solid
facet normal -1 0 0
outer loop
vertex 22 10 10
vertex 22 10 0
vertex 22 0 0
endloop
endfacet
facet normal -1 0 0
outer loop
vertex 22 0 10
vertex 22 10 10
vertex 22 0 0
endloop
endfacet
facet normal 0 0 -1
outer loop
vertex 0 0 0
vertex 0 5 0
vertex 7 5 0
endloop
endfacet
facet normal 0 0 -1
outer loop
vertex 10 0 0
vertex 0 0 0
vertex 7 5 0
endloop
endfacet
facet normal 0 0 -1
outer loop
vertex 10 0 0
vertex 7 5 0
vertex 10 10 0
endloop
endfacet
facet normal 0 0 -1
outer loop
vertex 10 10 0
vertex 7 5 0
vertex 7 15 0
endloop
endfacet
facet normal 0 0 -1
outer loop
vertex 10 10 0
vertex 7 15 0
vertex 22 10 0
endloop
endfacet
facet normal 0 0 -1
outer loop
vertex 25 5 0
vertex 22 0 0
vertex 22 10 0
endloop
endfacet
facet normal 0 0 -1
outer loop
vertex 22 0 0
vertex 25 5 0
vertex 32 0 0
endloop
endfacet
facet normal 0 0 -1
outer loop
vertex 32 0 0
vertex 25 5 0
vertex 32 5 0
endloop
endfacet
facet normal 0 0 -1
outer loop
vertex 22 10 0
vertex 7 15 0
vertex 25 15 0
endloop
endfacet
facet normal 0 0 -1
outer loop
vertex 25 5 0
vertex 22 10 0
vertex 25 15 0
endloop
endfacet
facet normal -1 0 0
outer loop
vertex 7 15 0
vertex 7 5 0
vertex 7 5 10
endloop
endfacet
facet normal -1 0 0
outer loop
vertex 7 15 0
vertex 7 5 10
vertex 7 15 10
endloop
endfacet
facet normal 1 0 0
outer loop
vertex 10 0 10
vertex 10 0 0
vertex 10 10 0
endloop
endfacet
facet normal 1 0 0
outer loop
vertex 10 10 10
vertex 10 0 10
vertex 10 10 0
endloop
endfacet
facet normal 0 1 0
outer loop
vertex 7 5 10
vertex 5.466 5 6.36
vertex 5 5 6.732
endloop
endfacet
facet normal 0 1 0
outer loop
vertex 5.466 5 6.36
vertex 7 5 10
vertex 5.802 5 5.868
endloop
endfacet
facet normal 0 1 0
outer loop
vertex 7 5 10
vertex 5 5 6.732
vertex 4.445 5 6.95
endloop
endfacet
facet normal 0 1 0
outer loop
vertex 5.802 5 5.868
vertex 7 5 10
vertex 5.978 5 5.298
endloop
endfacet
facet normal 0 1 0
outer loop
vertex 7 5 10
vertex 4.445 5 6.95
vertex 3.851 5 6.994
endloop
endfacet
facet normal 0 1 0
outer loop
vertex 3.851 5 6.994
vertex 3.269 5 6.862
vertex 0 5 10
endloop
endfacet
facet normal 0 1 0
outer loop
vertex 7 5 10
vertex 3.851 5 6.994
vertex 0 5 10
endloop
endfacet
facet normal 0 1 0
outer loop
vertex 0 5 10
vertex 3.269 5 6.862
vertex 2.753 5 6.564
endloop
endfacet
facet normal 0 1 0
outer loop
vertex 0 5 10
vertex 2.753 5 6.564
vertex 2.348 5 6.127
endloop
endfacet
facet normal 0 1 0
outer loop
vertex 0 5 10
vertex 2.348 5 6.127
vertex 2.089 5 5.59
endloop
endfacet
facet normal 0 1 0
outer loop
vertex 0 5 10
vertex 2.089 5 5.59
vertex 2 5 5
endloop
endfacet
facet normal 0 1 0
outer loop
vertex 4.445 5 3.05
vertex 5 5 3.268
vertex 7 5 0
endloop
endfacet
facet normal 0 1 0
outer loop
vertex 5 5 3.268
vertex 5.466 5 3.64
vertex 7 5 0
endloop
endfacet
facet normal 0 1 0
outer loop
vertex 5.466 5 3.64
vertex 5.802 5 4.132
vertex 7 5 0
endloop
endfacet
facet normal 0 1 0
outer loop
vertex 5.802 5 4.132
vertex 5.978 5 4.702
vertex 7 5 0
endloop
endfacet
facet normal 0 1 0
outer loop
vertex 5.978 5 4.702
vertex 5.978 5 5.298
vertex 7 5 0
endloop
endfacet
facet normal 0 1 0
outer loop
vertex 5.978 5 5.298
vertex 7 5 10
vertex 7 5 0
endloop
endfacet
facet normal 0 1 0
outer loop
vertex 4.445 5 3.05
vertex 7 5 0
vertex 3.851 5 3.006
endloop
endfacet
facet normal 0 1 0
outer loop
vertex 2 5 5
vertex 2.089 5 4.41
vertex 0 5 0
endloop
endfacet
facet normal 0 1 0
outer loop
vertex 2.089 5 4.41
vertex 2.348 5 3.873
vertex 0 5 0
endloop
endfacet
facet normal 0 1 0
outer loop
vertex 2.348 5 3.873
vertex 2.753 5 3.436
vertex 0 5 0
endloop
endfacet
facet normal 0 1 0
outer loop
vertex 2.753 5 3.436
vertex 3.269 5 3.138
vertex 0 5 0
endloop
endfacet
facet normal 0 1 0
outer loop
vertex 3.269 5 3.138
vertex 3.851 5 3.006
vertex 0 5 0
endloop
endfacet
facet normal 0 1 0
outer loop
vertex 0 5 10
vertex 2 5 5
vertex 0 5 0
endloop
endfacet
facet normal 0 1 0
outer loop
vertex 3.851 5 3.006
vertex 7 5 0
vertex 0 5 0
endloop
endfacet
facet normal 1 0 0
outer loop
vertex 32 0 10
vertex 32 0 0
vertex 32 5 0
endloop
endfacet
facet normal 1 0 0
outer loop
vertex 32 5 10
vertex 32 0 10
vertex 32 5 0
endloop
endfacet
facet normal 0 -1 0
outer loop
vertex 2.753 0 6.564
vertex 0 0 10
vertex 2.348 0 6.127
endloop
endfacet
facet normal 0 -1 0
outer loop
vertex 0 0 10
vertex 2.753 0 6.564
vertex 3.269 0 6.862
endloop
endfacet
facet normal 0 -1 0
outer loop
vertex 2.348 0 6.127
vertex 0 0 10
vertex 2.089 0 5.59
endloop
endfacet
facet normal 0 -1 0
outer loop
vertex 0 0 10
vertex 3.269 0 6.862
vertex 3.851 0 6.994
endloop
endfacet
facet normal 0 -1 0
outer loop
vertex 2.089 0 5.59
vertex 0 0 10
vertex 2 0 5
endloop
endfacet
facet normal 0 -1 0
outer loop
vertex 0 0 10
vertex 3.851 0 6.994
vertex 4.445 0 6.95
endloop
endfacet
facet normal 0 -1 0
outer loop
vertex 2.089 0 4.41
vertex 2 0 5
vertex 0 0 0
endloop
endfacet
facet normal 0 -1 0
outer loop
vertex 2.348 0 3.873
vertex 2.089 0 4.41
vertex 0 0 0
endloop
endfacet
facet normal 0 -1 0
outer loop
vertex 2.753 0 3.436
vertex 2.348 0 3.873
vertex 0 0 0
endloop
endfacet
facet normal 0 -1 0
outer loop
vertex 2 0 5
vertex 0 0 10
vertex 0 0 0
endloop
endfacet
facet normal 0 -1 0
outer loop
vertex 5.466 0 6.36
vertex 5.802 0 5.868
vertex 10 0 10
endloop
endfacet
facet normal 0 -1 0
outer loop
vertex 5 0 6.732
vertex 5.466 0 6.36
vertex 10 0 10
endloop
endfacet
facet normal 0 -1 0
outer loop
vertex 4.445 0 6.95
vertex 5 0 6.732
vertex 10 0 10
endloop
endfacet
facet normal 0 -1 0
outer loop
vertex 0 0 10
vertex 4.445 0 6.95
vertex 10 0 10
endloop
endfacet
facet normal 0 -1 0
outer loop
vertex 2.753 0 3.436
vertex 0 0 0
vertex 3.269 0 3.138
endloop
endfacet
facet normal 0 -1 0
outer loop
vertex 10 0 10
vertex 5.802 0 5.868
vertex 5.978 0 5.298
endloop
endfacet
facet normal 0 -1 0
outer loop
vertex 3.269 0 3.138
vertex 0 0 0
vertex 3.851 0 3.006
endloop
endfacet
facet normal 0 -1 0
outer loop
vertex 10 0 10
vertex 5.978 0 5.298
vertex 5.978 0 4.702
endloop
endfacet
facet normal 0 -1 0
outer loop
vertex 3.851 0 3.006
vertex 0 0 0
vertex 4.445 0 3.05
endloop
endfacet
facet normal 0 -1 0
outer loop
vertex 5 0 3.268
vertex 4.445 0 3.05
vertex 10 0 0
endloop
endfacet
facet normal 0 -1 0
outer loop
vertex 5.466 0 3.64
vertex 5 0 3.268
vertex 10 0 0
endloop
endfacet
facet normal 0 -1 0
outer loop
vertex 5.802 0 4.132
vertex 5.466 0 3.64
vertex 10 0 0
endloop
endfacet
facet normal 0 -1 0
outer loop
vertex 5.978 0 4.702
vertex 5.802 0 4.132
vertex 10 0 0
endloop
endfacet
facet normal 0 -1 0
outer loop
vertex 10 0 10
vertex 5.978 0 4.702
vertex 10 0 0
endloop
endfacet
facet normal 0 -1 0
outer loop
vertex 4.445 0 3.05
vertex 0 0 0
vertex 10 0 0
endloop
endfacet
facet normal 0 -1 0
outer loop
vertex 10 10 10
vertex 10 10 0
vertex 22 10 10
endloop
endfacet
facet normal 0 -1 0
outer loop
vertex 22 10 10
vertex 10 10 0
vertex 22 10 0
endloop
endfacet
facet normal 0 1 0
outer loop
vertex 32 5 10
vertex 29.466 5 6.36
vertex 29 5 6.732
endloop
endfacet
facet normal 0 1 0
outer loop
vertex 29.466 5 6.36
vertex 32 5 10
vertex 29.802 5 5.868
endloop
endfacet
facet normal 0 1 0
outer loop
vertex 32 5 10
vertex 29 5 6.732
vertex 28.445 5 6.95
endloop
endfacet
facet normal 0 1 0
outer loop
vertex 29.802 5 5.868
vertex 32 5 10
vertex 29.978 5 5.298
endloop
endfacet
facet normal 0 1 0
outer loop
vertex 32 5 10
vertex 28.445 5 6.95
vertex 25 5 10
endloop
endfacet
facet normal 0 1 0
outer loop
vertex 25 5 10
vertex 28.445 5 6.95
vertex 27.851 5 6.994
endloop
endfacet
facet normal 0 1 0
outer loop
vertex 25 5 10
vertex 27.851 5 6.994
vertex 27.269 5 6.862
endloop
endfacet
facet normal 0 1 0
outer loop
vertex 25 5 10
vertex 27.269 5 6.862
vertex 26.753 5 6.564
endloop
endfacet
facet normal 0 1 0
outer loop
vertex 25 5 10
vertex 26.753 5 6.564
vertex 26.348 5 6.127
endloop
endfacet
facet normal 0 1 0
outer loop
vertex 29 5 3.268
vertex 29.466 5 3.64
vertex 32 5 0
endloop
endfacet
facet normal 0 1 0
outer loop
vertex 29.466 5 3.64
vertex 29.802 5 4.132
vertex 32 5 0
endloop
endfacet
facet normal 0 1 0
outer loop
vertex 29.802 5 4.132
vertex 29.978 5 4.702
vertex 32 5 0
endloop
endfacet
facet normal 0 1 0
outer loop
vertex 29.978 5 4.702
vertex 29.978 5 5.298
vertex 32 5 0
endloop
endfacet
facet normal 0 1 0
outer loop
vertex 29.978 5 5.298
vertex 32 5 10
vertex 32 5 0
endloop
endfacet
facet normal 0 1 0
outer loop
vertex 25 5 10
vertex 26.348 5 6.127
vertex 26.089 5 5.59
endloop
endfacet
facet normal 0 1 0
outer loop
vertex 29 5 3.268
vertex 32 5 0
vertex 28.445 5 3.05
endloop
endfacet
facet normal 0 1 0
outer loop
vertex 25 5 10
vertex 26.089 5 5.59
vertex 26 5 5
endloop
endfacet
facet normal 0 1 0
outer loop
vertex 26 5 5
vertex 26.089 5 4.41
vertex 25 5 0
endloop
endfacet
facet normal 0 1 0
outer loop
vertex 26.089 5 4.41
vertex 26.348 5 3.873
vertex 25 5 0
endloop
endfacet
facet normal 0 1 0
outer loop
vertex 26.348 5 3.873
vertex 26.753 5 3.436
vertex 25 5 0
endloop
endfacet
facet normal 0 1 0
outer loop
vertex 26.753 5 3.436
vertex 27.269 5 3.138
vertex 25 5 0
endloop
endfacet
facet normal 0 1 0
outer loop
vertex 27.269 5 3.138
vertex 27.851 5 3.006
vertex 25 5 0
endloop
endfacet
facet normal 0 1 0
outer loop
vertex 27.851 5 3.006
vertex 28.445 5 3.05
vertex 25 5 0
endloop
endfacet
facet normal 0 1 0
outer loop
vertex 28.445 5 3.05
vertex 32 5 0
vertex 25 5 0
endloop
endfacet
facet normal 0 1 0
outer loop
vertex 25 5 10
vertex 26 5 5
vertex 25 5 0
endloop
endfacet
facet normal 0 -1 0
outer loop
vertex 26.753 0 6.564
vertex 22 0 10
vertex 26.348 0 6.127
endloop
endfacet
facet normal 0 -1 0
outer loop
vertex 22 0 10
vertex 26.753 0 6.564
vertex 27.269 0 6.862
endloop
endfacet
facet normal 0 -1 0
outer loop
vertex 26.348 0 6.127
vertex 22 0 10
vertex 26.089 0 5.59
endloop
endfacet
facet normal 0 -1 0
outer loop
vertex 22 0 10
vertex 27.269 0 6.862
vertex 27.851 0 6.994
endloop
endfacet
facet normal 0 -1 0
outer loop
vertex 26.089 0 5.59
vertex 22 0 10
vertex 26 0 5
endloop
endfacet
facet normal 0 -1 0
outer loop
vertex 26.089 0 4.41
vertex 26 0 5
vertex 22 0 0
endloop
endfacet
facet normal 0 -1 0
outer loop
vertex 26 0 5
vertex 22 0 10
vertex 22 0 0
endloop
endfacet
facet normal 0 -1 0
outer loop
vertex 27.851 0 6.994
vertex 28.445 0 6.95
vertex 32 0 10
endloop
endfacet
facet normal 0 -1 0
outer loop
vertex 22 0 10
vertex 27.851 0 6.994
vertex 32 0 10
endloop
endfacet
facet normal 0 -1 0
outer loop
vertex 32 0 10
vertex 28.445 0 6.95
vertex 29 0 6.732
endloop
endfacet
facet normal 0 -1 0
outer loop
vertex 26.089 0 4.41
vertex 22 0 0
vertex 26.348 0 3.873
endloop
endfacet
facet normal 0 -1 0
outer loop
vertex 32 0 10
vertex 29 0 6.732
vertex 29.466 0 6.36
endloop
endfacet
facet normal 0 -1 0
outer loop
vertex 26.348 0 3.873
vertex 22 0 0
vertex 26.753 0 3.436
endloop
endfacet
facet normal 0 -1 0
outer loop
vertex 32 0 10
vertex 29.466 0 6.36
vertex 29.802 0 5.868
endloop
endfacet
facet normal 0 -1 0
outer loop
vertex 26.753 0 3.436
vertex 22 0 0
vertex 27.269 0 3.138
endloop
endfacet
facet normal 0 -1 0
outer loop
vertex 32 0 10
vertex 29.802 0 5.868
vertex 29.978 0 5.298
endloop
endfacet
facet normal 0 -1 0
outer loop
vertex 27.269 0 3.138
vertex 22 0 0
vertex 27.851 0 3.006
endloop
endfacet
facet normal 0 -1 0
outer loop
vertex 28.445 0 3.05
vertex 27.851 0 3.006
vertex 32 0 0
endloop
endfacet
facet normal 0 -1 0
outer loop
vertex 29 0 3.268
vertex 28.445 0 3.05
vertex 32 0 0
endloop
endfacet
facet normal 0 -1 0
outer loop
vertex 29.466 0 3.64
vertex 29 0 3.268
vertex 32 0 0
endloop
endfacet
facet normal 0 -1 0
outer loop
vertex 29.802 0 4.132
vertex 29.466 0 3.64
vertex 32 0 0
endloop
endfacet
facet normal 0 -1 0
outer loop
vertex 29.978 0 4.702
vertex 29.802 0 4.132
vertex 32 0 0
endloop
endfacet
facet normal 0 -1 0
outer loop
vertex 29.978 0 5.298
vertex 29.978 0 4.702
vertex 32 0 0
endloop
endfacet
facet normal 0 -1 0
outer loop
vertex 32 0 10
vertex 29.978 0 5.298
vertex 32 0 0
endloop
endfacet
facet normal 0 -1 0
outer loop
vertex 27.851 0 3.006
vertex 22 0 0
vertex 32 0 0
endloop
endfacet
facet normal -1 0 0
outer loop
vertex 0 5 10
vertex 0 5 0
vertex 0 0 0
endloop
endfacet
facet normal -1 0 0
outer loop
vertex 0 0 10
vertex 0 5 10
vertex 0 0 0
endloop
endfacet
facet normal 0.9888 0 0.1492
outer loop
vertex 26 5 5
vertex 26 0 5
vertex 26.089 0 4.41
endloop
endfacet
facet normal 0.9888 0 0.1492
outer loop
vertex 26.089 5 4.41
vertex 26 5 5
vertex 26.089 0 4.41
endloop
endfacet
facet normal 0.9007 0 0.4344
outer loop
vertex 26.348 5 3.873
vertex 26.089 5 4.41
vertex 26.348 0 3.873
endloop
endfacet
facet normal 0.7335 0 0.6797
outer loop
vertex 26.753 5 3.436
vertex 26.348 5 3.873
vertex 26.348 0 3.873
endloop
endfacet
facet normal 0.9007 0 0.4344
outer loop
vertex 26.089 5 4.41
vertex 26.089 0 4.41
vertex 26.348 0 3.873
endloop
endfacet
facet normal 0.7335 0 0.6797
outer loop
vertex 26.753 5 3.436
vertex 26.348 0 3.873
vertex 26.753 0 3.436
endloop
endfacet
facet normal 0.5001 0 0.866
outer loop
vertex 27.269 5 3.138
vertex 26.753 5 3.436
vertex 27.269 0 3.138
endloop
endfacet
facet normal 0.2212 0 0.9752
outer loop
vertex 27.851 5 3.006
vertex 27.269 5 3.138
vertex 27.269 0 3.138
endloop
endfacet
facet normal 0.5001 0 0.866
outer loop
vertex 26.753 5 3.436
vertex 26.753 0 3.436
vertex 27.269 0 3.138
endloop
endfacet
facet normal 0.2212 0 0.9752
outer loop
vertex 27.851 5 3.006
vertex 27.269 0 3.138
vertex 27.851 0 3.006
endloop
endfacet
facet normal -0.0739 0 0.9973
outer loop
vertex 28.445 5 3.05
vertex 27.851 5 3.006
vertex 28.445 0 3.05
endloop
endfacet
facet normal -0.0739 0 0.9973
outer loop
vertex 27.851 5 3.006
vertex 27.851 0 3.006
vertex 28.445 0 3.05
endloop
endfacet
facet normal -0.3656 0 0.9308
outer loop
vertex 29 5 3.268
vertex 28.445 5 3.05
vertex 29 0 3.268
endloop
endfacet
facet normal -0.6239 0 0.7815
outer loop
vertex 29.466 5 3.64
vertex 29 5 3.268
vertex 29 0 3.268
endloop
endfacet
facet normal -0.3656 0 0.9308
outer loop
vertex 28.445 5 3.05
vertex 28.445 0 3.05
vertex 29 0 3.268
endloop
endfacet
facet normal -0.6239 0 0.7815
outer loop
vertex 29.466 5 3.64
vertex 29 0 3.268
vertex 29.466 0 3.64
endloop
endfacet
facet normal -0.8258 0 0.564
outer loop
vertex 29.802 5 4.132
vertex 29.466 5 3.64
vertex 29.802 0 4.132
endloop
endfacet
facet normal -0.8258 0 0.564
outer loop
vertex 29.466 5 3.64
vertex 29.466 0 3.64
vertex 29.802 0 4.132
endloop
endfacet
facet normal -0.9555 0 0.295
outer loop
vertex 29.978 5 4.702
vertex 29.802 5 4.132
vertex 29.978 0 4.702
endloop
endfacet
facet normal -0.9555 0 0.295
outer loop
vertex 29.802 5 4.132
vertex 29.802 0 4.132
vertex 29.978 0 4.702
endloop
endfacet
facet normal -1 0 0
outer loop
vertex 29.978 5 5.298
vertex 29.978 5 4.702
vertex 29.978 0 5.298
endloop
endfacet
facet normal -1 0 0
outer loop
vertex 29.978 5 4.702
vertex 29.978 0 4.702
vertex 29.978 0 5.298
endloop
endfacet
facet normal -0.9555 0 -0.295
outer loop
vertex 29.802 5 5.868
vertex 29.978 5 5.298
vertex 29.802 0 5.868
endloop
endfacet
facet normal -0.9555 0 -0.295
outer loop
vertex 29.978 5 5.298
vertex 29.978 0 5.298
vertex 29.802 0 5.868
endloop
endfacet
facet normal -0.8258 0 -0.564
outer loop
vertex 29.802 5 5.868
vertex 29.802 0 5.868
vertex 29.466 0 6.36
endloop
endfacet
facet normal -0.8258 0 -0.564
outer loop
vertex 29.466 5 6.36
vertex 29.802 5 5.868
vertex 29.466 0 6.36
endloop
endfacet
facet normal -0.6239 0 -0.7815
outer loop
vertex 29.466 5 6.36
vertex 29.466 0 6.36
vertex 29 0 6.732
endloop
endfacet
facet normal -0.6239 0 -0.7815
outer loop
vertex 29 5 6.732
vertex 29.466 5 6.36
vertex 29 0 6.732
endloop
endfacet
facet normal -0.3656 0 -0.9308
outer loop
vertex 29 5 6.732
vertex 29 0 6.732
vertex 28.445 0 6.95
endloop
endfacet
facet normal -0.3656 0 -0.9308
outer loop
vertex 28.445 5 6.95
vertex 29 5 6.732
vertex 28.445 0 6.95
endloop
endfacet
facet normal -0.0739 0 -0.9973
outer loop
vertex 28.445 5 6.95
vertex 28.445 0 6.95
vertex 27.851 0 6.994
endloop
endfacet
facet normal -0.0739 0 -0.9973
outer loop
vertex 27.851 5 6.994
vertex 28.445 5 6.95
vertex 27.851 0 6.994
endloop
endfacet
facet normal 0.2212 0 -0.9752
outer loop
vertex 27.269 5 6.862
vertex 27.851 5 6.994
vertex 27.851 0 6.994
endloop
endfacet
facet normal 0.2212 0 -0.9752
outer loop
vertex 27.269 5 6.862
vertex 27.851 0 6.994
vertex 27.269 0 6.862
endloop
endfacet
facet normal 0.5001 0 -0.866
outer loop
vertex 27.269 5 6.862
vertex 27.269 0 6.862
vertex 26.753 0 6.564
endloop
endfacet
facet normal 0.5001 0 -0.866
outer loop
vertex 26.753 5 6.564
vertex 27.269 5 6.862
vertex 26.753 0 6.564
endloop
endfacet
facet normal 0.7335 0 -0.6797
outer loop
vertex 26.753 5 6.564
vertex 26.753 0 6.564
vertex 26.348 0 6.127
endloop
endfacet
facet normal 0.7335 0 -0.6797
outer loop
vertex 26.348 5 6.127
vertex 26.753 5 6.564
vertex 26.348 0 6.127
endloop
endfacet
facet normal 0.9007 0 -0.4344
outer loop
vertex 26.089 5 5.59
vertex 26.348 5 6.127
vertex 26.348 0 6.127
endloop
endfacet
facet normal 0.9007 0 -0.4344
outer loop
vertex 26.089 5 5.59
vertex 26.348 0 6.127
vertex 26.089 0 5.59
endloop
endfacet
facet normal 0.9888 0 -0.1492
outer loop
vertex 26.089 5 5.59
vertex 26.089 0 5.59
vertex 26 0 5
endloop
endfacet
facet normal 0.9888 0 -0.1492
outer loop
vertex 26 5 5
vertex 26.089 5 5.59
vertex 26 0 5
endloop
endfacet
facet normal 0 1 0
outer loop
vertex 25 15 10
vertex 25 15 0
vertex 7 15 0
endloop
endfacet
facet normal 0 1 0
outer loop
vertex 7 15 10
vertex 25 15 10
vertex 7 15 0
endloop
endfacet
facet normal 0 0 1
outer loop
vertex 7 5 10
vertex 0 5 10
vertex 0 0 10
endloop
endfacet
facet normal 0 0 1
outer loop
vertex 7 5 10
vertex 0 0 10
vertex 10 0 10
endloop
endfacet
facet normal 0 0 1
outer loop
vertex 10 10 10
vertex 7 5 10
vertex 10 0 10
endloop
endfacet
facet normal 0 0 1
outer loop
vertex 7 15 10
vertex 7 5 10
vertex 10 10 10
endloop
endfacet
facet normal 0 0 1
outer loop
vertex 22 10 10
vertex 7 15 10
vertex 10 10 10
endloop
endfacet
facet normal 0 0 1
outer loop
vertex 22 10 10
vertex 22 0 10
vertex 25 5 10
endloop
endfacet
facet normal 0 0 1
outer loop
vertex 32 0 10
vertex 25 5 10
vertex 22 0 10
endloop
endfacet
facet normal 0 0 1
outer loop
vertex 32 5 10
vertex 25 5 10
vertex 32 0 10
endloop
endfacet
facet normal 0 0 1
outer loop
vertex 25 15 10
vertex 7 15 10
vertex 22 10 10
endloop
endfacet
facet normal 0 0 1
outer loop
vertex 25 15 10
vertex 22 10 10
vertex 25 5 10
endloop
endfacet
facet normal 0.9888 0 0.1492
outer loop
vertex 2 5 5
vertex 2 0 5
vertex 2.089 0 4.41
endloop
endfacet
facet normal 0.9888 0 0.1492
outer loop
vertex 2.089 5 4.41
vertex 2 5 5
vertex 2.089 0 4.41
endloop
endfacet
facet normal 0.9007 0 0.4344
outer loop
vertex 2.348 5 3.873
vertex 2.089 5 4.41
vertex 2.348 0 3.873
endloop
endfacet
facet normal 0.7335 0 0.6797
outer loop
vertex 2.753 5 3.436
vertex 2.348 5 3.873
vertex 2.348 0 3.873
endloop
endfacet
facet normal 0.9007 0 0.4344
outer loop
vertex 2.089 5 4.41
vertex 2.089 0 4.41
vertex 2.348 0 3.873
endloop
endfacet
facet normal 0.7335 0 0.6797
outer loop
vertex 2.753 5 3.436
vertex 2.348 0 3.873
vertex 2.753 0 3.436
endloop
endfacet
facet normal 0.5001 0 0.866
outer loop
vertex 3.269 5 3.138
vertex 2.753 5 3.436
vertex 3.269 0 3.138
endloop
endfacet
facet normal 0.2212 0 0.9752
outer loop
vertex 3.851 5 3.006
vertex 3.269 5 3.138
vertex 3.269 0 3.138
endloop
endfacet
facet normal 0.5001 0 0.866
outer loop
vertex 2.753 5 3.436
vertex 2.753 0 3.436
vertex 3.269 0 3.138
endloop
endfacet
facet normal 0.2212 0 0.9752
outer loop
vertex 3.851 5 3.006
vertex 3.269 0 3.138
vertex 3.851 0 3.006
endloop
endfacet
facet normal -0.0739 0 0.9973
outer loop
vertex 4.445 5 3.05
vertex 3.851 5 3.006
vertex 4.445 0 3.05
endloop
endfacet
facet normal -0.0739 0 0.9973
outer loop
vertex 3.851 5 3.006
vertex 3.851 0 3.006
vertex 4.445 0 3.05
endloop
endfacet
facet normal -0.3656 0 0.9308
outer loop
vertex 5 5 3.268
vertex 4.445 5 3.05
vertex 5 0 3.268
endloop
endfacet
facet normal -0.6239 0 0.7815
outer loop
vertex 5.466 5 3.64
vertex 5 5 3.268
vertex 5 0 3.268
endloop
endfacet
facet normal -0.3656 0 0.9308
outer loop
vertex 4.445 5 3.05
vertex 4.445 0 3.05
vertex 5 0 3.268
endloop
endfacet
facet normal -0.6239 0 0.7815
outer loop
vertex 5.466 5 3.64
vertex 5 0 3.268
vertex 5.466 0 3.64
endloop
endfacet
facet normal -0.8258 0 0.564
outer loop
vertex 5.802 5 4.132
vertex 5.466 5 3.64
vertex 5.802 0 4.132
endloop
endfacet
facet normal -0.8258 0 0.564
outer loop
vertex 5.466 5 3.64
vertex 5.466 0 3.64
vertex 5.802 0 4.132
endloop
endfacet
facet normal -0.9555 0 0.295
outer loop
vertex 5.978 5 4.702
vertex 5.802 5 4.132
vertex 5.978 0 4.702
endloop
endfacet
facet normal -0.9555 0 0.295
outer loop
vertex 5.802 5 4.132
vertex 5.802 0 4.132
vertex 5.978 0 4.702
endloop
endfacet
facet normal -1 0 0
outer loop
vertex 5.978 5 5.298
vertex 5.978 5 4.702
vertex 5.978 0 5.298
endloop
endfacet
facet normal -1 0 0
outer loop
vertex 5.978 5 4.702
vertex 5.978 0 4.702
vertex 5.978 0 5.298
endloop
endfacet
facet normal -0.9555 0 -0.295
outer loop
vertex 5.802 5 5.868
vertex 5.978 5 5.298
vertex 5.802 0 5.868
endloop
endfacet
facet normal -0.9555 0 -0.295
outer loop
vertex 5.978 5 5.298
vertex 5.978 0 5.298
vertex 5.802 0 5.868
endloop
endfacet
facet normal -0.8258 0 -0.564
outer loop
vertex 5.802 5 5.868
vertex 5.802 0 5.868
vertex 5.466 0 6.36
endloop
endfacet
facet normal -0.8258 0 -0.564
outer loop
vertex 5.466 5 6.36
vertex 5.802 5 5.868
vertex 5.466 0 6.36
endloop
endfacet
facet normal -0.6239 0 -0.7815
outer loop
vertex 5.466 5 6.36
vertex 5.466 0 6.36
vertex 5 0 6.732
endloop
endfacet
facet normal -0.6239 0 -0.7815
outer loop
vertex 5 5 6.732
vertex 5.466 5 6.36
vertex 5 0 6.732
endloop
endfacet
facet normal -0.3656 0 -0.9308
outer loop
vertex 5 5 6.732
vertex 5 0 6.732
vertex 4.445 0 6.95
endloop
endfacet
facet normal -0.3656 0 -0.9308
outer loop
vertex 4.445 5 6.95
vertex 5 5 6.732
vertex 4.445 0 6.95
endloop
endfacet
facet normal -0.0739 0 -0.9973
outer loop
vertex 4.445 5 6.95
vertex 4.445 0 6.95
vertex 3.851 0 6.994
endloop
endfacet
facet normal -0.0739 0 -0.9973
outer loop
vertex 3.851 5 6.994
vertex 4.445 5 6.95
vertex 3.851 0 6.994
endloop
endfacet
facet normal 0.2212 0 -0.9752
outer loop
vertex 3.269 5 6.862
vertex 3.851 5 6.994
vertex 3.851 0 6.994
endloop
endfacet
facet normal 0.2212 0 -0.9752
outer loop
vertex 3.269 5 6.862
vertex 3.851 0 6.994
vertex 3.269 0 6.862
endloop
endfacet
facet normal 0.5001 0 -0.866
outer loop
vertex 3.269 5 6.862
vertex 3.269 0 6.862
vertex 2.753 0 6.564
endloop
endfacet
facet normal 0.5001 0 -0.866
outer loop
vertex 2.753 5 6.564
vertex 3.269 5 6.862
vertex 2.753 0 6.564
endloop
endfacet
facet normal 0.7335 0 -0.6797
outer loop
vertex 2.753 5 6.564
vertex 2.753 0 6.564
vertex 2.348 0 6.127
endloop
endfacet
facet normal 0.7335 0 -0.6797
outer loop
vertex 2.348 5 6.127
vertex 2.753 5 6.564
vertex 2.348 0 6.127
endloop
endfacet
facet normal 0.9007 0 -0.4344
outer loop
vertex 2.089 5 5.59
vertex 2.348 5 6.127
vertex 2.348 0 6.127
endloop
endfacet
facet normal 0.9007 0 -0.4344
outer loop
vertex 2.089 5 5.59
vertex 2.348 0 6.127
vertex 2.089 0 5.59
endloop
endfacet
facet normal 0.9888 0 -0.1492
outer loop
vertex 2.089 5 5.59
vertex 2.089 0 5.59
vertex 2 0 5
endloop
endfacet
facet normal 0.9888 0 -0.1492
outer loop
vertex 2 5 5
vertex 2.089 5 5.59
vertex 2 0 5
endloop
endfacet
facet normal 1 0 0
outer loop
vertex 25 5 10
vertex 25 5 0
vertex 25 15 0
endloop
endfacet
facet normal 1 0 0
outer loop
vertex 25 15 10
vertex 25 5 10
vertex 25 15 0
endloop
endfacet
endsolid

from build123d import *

# Parameters (mm, degrees)
RESSALTO_EXTRUS_O1_DEPTH = 10
ESBO_O2_R                = 2
CORTE_EXTRUS_O1_DEPTH    = 20
ESBO_O4_W                = 7
ESBO_O4_H                = 10
CORTE_EXTRUS_O2_DEPTH    = 20


with BuildPart() as part:
    # Esboço1 → Ressalto-extrusão1 (new body)
    with BuildSketch(Plane.XY):
        Polygon((32, 0), (32, 15), (0, 15), (0, 0), (10, 0), (10, 10), (22, 10), (22, 0), align=None)
    extrude(amount=RESSALTO_EXTRUS_O1_DEPTH)

    # Esboço2 → Corte-extrusão1 (cut)
    with BuildSketch(Plane(origin=(0, 0, 0), x_dir=(-1, 0, 0), z_dir=(0, -1, 0))):
        with Locations((-4, -5)):
            Circle(ESBO_O2_R)
        with Locations((-28, -5)):
            Circle(ESBO_O2_R)
    extrude(amount=-CORTE_EXTRUS_O1_DEPTH, mode=Mode.SUBTRACT)

    # Esboço4 → Corte-extrusão2 (cut)
    with BuildSketch(Plane(origin=(0, 0, 0), x_dir=(-1, 0, 0), z_dir=(0, 0, -1))):
        with Locations((-28.5, 10)):
            Rectangle(ESBO_O4_W, ESBO_O4_H)
        with Locations((-3.5, 10)):
            Rectangle(ESBO_O4_W, ESBO_O4_H)
    extrude(amount=-CORTE_EXTRUS_O2_DEPTH, mode=Mode.SUBTRACT)


solid = part.part
